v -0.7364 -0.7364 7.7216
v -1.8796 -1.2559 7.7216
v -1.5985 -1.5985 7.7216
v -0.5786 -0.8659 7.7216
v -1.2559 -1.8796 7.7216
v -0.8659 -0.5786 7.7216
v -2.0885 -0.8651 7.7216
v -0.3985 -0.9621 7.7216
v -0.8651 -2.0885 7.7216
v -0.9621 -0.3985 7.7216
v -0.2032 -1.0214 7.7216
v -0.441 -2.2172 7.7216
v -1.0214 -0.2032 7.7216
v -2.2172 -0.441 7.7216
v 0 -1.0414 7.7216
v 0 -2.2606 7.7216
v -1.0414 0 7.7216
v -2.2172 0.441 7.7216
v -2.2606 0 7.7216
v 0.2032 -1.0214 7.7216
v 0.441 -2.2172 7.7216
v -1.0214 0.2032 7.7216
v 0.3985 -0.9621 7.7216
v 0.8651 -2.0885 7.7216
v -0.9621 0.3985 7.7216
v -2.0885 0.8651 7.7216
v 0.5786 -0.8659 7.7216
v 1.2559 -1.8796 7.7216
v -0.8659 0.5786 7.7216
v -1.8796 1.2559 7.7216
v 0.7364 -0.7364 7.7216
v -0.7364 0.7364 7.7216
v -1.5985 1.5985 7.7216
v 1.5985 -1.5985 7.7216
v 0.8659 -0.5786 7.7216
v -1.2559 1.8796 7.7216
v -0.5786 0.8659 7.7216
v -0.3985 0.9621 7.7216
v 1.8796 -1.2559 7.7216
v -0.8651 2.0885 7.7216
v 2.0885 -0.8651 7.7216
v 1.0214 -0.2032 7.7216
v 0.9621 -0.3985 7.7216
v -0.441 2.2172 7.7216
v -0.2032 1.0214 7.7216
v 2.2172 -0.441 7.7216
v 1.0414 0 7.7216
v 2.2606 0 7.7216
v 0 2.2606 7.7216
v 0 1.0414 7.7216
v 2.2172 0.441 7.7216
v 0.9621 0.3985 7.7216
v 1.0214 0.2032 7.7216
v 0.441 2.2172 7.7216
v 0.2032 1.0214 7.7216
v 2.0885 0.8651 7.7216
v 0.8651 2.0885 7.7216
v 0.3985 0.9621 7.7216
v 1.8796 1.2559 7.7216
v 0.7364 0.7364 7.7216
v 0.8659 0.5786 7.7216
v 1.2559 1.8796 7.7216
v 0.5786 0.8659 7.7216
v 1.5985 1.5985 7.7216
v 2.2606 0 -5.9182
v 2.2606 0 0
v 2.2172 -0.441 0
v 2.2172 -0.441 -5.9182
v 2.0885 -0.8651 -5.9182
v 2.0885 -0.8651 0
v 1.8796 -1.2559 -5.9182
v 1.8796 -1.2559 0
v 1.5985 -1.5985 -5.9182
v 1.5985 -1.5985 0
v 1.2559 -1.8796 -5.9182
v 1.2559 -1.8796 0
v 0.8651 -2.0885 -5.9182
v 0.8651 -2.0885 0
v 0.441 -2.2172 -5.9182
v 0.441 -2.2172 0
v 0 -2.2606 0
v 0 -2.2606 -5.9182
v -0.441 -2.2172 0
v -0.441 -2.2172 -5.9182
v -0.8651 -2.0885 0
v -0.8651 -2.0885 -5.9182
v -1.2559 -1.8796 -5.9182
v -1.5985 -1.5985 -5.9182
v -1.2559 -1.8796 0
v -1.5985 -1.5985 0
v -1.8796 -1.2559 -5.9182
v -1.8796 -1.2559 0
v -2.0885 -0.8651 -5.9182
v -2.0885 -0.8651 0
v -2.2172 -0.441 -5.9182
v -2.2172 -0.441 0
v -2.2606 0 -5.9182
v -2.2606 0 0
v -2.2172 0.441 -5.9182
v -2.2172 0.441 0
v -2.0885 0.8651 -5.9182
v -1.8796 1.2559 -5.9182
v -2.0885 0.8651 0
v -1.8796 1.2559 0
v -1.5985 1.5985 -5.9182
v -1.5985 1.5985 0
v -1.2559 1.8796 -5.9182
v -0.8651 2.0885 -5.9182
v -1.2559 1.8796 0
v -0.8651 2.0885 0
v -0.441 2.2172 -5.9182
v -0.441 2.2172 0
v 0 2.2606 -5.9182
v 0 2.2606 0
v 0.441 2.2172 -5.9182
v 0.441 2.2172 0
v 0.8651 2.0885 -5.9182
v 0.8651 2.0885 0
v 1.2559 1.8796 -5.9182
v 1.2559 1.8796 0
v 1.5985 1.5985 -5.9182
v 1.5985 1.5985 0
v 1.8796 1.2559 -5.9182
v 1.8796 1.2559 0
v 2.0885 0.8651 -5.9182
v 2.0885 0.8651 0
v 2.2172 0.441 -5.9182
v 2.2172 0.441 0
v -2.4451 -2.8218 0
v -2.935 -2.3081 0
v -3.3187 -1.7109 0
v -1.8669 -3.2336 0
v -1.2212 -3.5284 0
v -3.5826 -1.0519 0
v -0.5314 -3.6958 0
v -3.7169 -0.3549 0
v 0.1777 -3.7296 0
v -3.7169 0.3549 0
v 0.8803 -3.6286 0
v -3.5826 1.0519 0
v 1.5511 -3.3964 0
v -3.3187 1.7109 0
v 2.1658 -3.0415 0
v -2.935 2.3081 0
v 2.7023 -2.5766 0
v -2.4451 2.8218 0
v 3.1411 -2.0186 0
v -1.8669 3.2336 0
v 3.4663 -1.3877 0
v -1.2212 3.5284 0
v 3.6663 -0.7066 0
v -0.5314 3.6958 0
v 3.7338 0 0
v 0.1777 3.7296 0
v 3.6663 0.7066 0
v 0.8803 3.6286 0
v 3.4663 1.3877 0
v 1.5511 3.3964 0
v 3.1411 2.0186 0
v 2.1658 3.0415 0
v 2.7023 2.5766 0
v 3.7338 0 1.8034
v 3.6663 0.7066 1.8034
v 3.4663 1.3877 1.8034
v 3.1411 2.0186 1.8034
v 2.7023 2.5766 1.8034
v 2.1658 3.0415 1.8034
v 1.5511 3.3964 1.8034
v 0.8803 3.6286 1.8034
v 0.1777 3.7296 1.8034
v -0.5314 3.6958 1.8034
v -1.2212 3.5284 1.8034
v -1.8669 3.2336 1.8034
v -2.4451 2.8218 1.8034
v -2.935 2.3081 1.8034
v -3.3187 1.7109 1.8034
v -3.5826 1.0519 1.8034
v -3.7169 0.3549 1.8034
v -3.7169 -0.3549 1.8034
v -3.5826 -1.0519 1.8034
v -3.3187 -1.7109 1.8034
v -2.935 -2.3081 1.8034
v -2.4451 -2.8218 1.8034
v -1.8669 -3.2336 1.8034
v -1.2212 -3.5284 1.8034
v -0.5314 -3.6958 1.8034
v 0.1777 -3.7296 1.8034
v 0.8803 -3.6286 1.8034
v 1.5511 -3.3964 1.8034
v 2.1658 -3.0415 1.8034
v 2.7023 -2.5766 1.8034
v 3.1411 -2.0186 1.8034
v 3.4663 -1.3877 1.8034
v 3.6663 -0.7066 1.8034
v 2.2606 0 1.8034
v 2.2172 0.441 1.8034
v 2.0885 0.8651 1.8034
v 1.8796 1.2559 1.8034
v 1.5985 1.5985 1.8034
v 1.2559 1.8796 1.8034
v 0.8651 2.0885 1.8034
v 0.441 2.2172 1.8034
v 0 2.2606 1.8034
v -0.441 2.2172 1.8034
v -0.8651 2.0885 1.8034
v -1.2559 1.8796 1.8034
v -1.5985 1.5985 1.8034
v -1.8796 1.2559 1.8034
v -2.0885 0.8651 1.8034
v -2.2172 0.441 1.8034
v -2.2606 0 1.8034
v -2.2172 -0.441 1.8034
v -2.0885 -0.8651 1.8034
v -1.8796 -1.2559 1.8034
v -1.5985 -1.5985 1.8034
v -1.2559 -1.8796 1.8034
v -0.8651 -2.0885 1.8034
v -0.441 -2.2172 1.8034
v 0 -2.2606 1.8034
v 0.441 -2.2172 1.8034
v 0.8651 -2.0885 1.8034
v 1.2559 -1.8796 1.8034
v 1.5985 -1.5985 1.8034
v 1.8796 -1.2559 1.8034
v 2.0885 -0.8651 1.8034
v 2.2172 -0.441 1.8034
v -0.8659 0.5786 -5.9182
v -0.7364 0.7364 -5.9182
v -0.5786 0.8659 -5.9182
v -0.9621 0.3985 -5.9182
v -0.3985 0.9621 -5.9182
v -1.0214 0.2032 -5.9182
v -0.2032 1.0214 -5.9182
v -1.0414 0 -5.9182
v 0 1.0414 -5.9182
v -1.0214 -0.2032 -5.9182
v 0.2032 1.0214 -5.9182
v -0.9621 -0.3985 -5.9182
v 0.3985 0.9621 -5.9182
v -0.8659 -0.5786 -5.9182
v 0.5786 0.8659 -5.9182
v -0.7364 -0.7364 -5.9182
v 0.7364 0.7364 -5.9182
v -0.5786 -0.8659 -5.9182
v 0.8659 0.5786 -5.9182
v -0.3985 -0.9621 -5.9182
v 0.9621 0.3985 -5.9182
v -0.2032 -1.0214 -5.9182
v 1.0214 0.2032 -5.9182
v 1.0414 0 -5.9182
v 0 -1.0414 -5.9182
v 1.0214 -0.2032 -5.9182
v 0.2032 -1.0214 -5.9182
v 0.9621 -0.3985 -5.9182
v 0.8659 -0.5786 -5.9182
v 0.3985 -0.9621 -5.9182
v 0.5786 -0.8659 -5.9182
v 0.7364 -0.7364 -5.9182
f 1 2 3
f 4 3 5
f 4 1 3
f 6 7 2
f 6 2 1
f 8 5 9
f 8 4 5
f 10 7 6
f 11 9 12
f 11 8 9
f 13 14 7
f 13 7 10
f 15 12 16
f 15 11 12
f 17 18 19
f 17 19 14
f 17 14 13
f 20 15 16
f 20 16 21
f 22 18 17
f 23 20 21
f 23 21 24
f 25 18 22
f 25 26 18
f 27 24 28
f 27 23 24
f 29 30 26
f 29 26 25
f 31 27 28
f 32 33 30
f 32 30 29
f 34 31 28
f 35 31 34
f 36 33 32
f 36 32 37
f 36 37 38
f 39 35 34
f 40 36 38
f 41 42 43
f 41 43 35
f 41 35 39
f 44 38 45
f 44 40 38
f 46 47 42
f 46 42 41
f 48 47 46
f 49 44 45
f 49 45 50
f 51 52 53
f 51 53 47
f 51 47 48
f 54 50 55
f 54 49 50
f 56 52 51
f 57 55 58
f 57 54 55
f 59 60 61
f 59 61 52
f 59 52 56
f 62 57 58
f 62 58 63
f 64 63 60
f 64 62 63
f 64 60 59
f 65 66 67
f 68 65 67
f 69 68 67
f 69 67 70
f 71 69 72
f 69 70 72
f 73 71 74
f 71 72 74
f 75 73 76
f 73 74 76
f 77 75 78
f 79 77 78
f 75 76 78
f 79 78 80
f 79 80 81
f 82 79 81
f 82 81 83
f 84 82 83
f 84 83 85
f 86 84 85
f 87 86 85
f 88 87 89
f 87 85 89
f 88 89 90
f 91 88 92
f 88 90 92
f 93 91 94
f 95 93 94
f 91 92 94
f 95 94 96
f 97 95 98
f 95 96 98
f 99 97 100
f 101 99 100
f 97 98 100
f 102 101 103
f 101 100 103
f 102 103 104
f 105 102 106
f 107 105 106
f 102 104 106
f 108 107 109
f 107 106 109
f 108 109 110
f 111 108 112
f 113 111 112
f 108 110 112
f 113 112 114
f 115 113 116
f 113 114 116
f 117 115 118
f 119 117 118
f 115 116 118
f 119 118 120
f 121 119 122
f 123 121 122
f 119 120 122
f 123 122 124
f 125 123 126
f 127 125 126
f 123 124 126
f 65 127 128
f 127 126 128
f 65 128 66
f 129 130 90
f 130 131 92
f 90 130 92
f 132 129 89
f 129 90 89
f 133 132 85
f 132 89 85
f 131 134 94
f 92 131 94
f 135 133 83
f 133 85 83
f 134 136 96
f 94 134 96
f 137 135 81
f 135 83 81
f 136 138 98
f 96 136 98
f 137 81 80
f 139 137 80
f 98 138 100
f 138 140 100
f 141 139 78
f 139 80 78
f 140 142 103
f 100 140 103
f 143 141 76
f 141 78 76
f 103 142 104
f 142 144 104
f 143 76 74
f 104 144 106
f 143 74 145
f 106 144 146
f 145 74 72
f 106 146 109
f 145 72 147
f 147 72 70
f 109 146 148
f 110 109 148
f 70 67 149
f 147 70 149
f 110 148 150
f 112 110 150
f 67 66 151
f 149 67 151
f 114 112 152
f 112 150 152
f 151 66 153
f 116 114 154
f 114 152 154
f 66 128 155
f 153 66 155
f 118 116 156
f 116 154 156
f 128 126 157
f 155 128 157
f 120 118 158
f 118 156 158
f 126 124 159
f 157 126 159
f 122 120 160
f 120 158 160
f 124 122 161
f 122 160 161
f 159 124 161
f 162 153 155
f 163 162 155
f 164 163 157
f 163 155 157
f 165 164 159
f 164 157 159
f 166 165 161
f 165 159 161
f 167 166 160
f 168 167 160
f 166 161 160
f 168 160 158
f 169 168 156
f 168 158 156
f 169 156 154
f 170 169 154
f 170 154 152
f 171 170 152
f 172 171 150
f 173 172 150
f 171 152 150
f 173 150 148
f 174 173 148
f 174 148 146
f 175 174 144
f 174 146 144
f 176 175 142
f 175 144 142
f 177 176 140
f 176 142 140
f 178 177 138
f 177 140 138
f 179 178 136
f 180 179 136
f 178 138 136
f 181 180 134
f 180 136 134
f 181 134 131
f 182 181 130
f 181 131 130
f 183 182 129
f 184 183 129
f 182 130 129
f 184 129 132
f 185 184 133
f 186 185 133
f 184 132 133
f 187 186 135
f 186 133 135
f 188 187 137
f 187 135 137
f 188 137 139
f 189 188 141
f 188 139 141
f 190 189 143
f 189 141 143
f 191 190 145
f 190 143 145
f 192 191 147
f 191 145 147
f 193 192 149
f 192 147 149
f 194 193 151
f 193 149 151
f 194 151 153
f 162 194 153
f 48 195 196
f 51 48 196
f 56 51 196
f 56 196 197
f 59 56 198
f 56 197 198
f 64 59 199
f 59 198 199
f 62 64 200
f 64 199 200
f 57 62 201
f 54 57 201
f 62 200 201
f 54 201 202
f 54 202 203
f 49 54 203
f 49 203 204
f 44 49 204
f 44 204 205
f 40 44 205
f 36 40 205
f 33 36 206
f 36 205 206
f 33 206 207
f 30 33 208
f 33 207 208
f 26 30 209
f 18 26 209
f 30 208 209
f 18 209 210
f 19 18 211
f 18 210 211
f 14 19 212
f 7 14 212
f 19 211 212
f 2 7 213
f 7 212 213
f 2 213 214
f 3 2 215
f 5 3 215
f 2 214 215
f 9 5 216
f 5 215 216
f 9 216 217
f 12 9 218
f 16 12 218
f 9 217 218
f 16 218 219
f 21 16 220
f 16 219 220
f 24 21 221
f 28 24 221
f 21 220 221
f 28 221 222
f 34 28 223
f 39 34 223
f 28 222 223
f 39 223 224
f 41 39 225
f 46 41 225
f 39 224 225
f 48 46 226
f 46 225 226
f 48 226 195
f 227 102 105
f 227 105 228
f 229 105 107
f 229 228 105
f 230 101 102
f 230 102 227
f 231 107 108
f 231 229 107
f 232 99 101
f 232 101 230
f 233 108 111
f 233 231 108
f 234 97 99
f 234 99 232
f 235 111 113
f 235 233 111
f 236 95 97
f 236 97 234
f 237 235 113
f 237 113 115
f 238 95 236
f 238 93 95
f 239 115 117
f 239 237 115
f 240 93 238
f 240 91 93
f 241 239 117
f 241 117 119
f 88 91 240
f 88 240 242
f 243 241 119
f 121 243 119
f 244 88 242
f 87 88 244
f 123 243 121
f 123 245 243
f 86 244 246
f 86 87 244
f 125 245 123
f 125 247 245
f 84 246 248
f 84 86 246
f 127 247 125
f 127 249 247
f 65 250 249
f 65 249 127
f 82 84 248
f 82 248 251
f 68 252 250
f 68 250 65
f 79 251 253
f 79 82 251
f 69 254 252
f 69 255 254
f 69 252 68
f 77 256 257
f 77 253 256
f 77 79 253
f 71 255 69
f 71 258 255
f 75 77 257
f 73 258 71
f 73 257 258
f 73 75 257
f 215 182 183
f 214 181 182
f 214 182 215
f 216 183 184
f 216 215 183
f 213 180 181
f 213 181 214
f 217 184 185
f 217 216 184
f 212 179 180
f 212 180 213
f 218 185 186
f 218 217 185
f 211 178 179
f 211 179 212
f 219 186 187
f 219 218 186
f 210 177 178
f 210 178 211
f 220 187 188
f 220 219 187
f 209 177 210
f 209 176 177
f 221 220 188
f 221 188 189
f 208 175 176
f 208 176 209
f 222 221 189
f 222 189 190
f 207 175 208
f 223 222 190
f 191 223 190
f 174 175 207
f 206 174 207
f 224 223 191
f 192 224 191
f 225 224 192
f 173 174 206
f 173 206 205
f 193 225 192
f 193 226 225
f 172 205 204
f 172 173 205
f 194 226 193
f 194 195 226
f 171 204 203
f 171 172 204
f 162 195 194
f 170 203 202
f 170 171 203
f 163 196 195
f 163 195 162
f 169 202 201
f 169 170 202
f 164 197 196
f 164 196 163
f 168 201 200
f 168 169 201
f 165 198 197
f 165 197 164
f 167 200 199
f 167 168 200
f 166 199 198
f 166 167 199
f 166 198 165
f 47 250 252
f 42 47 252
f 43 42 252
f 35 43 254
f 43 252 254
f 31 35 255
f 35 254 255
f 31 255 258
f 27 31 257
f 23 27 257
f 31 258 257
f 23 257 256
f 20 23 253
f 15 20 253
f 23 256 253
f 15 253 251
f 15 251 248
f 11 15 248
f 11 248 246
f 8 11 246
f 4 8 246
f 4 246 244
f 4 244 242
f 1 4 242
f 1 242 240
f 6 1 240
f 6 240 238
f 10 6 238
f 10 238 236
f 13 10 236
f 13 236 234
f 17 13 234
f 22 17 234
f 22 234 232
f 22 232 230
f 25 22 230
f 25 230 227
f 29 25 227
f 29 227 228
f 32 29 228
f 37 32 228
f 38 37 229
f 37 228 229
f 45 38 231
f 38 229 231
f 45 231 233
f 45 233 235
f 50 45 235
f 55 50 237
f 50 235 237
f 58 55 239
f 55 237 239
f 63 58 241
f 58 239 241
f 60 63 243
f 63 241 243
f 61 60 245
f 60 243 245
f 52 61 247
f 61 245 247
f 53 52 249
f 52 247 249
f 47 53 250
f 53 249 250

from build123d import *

# Parameters (mm, degrees)
F0_R     = 3.7338
F1_DEPTH = 1.8034
F2_R     = 2.2606
F3_DEPTH = 5.9182
F4_R     = 2.2606
F5_DEPTH = 5.9182
F6_R     = 1.0414
F7_DEPTH = 25.4


with BuildPart() as f1:
    # F0 (on Top) → F1 (new body)
    with BuildSketch(Plane.XY):
        Circle(F0_R)
    extrude(amount=F1_DEPTH)

    # F2 (on face) → F3 (join)
    with BuildSketch(Plane.XY.offset(1.8034)):
        Circle(F2_R)
    extrude(amount=F3_DEPTH)

    # F4 (on face) → F5 (join)
    with BuildSketch(Plane(origin=(0, 0, 0), x_dir=(1, 0, 0), z_dir=(0, 0, -1))):
        Circle(F4_R)
    extrude(amount=F5_DEPTH)

    # F6 (on face) → F7 (cut)
    with BuildSketch(Plane(origin=(0, 0, -5.9182), x_dir=(1, 0, 0), z_dir=(0, 0, -1))):
        Circle(F6_R)
    extrude(amount=-F7_DEPTH, mode=Mode.SUBTRACT)


solid = f1.part
